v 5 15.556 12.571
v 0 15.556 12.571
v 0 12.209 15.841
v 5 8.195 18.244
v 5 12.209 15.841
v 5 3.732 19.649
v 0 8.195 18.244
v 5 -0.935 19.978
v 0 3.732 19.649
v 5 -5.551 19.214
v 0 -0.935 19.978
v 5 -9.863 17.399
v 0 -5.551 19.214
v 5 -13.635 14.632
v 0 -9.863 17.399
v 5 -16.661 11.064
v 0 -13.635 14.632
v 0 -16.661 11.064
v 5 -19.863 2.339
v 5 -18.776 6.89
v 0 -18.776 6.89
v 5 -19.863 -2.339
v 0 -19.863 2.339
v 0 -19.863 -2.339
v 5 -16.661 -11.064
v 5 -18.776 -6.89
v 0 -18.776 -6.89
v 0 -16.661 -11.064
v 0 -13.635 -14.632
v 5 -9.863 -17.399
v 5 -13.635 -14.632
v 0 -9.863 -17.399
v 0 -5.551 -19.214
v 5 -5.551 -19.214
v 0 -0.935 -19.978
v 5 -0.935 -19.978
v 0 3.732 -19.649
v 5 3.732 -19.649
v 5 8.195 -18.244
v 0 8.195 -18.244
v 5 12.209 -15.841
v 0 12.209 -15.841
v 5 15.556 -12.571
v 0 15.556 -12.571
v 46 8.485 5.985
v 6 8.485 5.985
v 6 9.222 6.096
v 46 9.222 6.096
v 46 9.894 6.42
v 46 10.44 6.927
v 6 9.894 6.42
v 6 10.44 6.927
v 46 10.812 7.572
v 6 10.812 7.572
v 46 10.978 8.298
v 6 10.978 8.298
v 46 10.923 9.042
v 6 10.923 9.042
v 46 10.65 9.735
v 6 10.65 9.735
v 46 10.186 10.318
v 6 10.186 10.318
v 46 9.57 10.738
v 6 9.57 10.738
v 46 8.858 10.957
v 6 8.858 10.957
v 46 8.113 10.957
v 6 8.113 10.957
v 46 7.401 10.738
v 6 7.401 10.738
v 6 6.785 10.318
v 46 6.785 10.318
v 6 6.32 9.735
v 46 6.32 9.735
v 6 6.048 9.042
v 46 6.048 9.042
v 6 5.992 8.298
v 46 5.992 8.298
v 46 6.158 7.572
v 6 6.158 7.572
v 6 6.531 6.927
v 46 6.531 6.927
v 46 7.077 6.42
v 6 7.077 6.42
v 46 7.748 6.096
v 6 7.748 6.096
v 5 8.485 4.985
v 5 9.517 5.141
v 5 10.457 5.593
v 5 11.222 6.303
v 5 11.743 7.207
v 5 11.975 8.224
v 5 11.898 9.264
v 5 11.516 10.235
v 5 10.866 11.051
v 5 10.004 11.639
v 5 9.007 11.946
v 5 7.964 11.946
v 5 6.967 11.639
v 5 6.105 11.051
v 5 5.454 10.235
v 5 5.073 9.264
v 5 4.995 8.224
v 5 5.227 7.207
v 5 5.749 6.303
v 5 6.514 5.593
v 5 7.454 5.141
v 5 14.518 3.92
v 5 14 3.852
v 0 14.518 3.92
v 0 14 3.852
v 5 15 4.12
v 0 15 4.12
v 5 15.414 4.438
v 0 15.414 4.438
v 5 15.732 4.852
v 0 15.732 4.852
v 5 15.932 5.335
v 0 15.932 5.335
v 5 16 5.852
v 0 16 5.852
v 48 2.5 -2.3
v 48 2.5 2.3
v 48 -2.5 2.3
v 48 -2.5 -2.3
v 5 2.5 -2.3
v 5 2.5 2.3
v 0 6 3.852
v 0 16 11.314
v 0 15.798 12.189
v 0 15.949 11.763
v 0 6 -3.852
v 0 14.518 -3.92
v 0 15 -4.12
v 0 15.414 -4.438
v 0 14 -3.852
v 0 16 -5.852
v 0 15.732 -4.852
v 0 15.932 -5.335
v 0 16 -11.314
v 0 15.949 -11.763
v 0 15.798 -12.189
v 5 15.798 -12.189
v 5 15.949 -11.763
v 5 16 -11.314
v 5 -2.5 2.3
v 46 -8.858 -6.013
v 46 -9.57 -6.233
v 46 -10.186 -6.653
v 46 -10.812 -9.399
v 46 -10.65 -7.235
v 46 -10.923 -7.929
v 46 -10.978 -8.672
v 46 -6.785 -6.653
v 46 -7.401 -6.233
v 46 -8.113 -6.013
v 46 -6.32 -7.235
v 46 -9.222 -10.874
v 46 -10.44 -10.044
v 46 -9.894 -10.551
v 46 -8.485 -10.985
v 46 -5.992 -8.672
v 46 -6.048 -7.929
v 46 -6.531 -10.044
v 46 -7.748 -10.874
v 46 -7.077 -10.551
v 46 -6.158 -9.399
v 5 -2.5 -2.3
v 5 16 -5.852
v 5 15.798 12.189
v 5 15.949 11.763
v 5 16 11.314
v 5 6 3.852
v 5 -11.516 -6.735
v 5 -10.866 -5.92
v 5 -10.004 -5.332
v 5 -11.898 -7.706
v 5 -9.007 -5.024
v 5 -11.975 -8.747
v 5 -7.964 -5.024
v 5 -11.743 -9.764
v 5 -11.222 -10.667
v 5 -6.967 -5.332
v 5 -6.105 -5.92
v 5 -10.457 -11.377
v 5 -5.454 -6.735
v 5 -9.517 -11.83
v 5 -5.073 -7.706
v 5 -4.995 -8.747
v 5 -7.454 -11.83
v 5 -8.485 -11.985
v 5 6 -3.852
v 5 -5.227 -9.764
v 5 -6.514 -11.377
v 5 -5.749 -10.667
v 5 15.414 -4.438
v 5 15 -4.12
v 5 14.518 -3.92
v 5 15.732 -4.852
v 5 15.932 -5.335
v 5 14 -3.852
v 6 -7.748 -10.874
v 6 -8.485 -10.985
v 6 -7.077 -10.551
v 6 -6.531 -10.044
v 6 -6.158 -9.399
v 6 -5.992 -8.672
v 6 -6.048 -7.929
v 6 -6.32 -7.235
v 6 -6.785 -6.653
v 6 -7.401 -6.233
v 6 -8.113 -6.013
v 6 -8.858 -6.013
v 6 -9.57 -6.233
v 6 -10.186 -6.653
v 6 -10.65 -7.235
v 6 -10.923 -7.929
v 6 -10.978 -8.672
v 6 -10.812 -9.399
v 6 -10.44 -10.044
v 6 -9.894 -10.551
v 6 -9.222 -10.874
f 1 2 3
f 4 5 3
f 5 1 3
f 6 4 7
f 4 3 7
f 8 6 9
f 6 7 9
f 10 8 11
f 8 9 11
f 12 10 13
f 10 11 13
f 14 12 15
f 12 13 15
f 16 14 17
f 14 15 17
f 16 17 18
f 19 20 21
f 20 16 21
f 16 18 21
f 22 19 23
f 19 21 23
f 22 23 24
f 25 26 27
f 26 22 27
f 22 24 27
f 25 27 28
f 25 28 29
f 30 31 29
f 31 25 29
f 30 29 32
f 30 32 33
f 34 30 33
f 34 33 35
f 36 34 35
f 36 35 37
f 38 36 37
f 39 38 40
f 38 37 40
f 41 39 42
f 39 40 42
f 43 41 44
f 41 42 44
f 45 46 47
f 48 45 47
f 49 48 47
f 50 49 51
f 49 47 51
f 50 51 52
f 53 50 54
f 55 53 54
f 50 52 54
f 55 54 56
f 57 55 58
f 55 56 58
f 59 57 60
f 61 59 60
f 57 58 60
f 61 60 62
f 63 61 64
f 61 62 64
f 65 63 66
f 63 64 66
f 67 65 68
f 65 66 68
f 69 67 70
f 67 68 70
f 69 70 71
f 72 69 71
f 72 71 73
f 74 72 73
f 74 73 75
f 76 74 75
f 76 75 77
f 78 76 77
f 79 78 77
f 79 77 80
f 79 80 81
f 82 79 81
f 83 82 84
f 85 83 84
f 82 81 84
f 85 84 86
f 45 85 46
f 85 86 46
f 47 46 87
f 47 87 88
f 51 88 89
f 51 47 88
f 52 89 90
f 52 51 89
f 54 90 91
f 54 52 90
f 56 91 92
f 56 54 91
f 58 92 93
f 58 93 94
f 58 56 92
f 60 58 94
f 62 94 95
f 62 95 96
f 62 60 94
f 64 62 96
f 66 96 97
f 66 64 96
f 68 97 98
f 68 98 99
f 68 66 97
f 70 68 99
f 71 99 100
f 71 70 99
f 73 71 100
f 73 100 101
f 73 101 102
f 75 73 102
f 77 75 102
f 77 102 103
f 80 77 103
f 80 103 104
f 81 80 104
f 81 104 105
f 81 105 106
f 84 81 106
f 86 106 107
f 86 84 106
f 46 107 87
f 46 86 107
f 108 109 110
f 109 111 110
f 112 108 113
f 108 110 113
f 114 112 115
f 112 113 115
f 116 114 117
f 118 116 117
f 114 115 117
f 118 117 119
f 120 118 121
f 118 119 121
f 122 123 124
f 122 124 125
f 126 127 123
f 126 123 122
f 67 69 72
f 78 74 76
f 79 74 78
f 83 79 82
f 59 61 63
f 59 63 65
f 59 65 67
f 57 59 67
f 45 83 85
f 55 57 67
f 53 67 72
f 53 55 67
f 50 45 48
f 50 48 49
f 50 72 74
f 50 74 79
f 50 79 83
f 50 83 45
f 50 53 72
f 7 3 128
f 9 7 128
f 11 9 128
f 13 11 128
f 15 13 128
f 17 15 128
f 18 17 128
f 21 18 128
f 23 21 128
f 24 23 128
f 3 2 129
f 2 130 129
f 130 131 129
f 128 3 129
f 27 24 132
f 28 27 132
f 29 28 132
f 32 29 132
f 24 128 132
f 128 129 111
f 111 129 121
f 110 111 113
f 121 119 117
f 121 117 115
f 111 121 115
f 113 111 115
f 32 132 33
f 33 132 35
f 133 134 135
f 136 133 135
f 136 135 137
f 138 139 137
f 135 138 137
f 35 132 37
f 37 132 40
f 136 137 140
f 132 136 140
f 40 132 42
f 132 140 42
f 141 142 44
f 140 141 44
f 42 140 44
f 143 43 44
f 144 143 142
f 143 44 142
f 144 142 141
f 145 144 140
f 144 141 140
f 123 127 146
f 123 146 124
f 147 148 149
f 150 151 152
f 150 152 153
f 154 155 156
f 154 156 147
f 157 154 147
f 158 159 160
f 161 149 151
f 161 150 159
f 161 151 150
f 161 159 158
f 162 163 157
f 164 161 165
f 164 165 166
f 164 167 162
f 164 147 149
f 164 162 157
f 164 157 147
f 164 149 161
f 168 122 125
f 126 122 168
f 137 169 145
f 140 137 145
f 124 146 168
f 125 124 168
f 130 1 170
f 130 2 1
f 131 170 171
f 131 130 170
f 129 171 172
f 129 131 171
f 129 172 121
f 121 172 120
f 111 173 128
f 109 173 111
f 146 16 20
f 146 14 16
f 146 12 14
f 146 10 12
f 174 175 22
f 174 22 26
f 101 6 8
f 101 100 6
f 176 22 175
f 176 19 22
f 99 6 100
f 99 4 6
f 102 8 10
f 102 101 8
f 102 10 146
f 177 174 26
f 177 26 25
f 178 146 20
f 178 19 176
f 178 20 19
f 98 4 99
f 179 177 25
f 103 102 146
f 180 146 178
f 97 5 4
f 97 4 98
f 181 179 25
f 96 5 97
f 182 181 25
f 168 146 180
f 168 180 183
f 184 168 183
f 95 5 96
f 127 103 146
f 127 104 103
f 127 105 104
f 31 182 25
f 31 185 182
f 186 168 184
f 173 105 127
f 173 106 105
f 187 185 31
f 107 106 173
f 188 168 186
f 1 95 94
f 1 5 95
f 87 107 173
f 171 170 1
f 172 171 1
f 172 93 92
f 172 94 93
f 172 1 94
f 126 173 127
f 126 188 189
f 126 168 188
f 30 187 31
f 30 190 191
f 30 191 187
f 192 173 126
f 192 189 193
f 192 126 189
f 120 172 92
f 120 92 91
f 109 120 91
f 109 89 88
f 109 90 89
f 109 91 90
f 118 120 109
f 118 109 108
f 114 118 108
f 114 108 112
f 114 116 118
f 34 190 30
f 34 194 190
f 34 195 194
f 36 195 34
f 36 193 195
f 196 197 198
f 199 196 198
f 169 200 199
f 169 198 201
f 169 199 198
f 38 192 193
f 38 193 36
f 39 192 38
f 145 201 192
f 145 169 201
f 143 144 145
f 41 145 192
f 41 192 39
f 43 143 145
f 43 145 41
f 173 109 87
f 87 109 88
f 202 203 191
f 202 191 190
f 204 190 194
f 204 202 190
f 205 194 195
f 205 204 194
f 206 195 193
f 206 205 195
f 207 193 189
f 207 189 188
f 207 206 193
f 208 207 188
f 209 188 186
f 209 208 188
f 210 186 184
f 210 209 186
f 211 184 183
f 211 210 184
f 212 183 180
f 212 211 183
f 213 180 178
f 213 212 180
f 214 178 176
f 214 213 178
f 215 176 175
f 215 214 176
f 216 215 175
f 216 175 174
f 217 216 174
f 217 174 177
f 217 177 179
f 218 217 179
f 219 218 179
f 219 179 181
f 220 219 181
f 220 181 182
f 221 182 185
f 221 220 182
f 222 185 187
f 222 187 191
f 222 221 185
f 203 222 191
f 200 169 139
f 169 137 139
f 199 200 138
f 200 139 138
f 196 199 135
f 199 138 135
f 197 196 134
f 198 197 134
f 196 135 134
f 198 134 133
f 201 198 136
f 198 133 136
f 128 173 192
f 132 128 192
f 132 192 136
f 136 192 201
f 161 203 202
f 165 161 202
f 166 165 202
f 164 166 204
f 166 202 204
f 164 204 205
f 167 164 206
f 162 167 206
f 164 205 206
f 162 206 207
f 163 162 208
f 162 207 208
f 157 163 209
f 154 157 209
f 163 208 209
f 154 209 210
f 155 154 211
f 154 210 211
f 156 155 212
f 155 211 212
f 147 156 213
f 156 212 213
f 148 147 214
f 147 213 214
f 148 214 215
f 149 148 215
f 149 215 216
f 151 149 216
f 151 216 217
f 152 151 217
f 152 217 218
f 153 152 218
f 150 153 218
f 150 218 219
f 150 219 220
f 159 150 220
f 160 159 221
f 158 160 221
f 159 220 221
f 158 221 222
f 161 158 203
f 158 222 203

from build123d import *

# Parameters (mm, degrees)
SKETCH2_R           = 20
BOSS_EXTRUDE2_DEPTH = 5
SKETCH3_W           = 5
SKETCH3_H           = 5
BOSS_EXTRUDE3_DEPTH = 43
SKETCH4_R           = 2.5
BOSS_EXTRUDE4_DEPTH = 41
SKETCH5_W           = 7.704684196
SKETCH5_H           = 10
CUT_EXTRUDE1_DEPTH  = 52.46843693
FILLET1_R           = 2
CHAMFER1_SIZE       = 1
SKETCH6_W           = 43
SKETCH6_H           = 5
CUT_EXTRUDE2_DEPTH  = 0.2
SKETCH7_W           = 43
SKETCH7_H           = 5
CUT_EXTRUDE3_DEPTH  = 0.2


with BuildPart() as part:
    # Sketch2 → Boss-Extrude2 (new body)
    with BuildSketch(Plane(origin=(0, 0, 0), x_dir=(0, 0, -1), z_dir=(1, 0, 0))):
        Circle(SKETCH2_R)
    extrude(amount=BOSS_EXTRUDE2_DEPTH)

    # Sketch3 → Boss-Extrude3 (add)
    with BuildSketch(Plane(origin=(5, 0, 0), x_dir=(0, 0, -1), z_dir=(1, 0, 0))):
        Rectangle(SKETCH3_W, SKETCH3_H)
    extrude(amount=BOSS_EXTRUDE3_DEPTH)

    # Sketch4 → Boss-Extrude4 (add)
    with BuildSketch(Plane(origin=(5, 0, 0), x_dir=(0, 0, -1), z_dir=(1, 0, 0))):
        with Locations((-8.485281374, 8.485281374)):
            Circle(SKETCH4_R)
        with Locations((8.485281374, -8.485281374)):
            Circle(SKETCH4_R)
    extrude(amount=BOSS_EXTRUDE4_DEPTH)

    # Sketch5 → Cut-Extrude1 (cut, through all)
    with BuildSketch(Plane(origin=(5, 0, 0), x_dir=(0, 0, -1), z_dir=(1, 0, 0))):
        with BuildLine():
            Line((-12, 16), (-3.852342098, 16))
            Line((-3.852342098, 16), (-3.852342098, 19.625479876))
            ThreePointArc((-3.852342098, 19.625479876), (-8.130818752, 18.272651324), (-12, 16))
        make_face()
        with BuildLine():
            Line((-3.852342098, 19.625479876), (-3.852342098, 16))
            Line((-3.852342098, 16), (3.852342098, 16))
            Line((3.852342098, 16), (3.852342098, 19.625479876))
            ThreePointArc((3.852342098, 19.625479876), (1.935252254, 19.906149771), (2.3e-08, 20))
            ThreePointArc((2.3e-08, 20), (-1.935252231, 19.906149773), (-3.852342098, 19.625479876))
        make_face()
        with BuildLine():
            Line((3.852342098, 19.625479876), (3.852342098, 16))
            Line((3.852342098, 16), (12, 16))
            ThreePointArc((12, 16), (8.130818752, 18.272651324), (3.852342098, 19.625479876))
        make_face()
        with Locations((0, 11)):
            Rectangle(SKETCH5_W, SKETCH5_H)
    extrude(amount=-CUT_EXTRUDE1_DEPTH, mode=Mode.SUBTRACT)

    # Fillet1
    fillet1_edges = [part.edges().sort_by_distance(p)[0] for p in [
        (2.5, 16, 12),
        (2.5, 16, -12),
        (2.5, 16, -3.852342098),
        (2.5, 16, 3.852342098),
    ]]
    fillet(fillet1_edges, radius=FILLET1_R)

    # Chamfer1
    chamfer1_edges = [part.edges().sort_by_distance(p)[0] for p in [
        (5, 8.485281374, 10.985281374),
        (5, -8.485281374, -5.985281374),
    ]]
    chamfer(chamfer1_edges, length=CHAMFER1_SIZE)

    # Sketch6 → Cut-Extrude2 (cut)
    with BuildSketch(Plane(origin=(0, 0, -2.5), x_dir=(-1, 0, 0), z_dir=(0, 0, -1))):
        with Locations((-26.5, 0)):
            Rectangle(SKETCH6_W, SKETCH6_H)
    extrude(amount=-CUT_EXTRUDE2_DEPTH, mode=Mode.SUBTRACT)

    # Sketch7 → Cut-Extrude3 (cut)
    with BuildSketch(Plane.XY.offset(2.5)):
        with Locations((26.5, 0)):
            Rectangle(SKETCH7_W, SKETCH7_H)
    extrude(amount=-CUT_EXTRUDE3_DEPTH, mode=Mode.SUBTRACT)


solid = part.part
